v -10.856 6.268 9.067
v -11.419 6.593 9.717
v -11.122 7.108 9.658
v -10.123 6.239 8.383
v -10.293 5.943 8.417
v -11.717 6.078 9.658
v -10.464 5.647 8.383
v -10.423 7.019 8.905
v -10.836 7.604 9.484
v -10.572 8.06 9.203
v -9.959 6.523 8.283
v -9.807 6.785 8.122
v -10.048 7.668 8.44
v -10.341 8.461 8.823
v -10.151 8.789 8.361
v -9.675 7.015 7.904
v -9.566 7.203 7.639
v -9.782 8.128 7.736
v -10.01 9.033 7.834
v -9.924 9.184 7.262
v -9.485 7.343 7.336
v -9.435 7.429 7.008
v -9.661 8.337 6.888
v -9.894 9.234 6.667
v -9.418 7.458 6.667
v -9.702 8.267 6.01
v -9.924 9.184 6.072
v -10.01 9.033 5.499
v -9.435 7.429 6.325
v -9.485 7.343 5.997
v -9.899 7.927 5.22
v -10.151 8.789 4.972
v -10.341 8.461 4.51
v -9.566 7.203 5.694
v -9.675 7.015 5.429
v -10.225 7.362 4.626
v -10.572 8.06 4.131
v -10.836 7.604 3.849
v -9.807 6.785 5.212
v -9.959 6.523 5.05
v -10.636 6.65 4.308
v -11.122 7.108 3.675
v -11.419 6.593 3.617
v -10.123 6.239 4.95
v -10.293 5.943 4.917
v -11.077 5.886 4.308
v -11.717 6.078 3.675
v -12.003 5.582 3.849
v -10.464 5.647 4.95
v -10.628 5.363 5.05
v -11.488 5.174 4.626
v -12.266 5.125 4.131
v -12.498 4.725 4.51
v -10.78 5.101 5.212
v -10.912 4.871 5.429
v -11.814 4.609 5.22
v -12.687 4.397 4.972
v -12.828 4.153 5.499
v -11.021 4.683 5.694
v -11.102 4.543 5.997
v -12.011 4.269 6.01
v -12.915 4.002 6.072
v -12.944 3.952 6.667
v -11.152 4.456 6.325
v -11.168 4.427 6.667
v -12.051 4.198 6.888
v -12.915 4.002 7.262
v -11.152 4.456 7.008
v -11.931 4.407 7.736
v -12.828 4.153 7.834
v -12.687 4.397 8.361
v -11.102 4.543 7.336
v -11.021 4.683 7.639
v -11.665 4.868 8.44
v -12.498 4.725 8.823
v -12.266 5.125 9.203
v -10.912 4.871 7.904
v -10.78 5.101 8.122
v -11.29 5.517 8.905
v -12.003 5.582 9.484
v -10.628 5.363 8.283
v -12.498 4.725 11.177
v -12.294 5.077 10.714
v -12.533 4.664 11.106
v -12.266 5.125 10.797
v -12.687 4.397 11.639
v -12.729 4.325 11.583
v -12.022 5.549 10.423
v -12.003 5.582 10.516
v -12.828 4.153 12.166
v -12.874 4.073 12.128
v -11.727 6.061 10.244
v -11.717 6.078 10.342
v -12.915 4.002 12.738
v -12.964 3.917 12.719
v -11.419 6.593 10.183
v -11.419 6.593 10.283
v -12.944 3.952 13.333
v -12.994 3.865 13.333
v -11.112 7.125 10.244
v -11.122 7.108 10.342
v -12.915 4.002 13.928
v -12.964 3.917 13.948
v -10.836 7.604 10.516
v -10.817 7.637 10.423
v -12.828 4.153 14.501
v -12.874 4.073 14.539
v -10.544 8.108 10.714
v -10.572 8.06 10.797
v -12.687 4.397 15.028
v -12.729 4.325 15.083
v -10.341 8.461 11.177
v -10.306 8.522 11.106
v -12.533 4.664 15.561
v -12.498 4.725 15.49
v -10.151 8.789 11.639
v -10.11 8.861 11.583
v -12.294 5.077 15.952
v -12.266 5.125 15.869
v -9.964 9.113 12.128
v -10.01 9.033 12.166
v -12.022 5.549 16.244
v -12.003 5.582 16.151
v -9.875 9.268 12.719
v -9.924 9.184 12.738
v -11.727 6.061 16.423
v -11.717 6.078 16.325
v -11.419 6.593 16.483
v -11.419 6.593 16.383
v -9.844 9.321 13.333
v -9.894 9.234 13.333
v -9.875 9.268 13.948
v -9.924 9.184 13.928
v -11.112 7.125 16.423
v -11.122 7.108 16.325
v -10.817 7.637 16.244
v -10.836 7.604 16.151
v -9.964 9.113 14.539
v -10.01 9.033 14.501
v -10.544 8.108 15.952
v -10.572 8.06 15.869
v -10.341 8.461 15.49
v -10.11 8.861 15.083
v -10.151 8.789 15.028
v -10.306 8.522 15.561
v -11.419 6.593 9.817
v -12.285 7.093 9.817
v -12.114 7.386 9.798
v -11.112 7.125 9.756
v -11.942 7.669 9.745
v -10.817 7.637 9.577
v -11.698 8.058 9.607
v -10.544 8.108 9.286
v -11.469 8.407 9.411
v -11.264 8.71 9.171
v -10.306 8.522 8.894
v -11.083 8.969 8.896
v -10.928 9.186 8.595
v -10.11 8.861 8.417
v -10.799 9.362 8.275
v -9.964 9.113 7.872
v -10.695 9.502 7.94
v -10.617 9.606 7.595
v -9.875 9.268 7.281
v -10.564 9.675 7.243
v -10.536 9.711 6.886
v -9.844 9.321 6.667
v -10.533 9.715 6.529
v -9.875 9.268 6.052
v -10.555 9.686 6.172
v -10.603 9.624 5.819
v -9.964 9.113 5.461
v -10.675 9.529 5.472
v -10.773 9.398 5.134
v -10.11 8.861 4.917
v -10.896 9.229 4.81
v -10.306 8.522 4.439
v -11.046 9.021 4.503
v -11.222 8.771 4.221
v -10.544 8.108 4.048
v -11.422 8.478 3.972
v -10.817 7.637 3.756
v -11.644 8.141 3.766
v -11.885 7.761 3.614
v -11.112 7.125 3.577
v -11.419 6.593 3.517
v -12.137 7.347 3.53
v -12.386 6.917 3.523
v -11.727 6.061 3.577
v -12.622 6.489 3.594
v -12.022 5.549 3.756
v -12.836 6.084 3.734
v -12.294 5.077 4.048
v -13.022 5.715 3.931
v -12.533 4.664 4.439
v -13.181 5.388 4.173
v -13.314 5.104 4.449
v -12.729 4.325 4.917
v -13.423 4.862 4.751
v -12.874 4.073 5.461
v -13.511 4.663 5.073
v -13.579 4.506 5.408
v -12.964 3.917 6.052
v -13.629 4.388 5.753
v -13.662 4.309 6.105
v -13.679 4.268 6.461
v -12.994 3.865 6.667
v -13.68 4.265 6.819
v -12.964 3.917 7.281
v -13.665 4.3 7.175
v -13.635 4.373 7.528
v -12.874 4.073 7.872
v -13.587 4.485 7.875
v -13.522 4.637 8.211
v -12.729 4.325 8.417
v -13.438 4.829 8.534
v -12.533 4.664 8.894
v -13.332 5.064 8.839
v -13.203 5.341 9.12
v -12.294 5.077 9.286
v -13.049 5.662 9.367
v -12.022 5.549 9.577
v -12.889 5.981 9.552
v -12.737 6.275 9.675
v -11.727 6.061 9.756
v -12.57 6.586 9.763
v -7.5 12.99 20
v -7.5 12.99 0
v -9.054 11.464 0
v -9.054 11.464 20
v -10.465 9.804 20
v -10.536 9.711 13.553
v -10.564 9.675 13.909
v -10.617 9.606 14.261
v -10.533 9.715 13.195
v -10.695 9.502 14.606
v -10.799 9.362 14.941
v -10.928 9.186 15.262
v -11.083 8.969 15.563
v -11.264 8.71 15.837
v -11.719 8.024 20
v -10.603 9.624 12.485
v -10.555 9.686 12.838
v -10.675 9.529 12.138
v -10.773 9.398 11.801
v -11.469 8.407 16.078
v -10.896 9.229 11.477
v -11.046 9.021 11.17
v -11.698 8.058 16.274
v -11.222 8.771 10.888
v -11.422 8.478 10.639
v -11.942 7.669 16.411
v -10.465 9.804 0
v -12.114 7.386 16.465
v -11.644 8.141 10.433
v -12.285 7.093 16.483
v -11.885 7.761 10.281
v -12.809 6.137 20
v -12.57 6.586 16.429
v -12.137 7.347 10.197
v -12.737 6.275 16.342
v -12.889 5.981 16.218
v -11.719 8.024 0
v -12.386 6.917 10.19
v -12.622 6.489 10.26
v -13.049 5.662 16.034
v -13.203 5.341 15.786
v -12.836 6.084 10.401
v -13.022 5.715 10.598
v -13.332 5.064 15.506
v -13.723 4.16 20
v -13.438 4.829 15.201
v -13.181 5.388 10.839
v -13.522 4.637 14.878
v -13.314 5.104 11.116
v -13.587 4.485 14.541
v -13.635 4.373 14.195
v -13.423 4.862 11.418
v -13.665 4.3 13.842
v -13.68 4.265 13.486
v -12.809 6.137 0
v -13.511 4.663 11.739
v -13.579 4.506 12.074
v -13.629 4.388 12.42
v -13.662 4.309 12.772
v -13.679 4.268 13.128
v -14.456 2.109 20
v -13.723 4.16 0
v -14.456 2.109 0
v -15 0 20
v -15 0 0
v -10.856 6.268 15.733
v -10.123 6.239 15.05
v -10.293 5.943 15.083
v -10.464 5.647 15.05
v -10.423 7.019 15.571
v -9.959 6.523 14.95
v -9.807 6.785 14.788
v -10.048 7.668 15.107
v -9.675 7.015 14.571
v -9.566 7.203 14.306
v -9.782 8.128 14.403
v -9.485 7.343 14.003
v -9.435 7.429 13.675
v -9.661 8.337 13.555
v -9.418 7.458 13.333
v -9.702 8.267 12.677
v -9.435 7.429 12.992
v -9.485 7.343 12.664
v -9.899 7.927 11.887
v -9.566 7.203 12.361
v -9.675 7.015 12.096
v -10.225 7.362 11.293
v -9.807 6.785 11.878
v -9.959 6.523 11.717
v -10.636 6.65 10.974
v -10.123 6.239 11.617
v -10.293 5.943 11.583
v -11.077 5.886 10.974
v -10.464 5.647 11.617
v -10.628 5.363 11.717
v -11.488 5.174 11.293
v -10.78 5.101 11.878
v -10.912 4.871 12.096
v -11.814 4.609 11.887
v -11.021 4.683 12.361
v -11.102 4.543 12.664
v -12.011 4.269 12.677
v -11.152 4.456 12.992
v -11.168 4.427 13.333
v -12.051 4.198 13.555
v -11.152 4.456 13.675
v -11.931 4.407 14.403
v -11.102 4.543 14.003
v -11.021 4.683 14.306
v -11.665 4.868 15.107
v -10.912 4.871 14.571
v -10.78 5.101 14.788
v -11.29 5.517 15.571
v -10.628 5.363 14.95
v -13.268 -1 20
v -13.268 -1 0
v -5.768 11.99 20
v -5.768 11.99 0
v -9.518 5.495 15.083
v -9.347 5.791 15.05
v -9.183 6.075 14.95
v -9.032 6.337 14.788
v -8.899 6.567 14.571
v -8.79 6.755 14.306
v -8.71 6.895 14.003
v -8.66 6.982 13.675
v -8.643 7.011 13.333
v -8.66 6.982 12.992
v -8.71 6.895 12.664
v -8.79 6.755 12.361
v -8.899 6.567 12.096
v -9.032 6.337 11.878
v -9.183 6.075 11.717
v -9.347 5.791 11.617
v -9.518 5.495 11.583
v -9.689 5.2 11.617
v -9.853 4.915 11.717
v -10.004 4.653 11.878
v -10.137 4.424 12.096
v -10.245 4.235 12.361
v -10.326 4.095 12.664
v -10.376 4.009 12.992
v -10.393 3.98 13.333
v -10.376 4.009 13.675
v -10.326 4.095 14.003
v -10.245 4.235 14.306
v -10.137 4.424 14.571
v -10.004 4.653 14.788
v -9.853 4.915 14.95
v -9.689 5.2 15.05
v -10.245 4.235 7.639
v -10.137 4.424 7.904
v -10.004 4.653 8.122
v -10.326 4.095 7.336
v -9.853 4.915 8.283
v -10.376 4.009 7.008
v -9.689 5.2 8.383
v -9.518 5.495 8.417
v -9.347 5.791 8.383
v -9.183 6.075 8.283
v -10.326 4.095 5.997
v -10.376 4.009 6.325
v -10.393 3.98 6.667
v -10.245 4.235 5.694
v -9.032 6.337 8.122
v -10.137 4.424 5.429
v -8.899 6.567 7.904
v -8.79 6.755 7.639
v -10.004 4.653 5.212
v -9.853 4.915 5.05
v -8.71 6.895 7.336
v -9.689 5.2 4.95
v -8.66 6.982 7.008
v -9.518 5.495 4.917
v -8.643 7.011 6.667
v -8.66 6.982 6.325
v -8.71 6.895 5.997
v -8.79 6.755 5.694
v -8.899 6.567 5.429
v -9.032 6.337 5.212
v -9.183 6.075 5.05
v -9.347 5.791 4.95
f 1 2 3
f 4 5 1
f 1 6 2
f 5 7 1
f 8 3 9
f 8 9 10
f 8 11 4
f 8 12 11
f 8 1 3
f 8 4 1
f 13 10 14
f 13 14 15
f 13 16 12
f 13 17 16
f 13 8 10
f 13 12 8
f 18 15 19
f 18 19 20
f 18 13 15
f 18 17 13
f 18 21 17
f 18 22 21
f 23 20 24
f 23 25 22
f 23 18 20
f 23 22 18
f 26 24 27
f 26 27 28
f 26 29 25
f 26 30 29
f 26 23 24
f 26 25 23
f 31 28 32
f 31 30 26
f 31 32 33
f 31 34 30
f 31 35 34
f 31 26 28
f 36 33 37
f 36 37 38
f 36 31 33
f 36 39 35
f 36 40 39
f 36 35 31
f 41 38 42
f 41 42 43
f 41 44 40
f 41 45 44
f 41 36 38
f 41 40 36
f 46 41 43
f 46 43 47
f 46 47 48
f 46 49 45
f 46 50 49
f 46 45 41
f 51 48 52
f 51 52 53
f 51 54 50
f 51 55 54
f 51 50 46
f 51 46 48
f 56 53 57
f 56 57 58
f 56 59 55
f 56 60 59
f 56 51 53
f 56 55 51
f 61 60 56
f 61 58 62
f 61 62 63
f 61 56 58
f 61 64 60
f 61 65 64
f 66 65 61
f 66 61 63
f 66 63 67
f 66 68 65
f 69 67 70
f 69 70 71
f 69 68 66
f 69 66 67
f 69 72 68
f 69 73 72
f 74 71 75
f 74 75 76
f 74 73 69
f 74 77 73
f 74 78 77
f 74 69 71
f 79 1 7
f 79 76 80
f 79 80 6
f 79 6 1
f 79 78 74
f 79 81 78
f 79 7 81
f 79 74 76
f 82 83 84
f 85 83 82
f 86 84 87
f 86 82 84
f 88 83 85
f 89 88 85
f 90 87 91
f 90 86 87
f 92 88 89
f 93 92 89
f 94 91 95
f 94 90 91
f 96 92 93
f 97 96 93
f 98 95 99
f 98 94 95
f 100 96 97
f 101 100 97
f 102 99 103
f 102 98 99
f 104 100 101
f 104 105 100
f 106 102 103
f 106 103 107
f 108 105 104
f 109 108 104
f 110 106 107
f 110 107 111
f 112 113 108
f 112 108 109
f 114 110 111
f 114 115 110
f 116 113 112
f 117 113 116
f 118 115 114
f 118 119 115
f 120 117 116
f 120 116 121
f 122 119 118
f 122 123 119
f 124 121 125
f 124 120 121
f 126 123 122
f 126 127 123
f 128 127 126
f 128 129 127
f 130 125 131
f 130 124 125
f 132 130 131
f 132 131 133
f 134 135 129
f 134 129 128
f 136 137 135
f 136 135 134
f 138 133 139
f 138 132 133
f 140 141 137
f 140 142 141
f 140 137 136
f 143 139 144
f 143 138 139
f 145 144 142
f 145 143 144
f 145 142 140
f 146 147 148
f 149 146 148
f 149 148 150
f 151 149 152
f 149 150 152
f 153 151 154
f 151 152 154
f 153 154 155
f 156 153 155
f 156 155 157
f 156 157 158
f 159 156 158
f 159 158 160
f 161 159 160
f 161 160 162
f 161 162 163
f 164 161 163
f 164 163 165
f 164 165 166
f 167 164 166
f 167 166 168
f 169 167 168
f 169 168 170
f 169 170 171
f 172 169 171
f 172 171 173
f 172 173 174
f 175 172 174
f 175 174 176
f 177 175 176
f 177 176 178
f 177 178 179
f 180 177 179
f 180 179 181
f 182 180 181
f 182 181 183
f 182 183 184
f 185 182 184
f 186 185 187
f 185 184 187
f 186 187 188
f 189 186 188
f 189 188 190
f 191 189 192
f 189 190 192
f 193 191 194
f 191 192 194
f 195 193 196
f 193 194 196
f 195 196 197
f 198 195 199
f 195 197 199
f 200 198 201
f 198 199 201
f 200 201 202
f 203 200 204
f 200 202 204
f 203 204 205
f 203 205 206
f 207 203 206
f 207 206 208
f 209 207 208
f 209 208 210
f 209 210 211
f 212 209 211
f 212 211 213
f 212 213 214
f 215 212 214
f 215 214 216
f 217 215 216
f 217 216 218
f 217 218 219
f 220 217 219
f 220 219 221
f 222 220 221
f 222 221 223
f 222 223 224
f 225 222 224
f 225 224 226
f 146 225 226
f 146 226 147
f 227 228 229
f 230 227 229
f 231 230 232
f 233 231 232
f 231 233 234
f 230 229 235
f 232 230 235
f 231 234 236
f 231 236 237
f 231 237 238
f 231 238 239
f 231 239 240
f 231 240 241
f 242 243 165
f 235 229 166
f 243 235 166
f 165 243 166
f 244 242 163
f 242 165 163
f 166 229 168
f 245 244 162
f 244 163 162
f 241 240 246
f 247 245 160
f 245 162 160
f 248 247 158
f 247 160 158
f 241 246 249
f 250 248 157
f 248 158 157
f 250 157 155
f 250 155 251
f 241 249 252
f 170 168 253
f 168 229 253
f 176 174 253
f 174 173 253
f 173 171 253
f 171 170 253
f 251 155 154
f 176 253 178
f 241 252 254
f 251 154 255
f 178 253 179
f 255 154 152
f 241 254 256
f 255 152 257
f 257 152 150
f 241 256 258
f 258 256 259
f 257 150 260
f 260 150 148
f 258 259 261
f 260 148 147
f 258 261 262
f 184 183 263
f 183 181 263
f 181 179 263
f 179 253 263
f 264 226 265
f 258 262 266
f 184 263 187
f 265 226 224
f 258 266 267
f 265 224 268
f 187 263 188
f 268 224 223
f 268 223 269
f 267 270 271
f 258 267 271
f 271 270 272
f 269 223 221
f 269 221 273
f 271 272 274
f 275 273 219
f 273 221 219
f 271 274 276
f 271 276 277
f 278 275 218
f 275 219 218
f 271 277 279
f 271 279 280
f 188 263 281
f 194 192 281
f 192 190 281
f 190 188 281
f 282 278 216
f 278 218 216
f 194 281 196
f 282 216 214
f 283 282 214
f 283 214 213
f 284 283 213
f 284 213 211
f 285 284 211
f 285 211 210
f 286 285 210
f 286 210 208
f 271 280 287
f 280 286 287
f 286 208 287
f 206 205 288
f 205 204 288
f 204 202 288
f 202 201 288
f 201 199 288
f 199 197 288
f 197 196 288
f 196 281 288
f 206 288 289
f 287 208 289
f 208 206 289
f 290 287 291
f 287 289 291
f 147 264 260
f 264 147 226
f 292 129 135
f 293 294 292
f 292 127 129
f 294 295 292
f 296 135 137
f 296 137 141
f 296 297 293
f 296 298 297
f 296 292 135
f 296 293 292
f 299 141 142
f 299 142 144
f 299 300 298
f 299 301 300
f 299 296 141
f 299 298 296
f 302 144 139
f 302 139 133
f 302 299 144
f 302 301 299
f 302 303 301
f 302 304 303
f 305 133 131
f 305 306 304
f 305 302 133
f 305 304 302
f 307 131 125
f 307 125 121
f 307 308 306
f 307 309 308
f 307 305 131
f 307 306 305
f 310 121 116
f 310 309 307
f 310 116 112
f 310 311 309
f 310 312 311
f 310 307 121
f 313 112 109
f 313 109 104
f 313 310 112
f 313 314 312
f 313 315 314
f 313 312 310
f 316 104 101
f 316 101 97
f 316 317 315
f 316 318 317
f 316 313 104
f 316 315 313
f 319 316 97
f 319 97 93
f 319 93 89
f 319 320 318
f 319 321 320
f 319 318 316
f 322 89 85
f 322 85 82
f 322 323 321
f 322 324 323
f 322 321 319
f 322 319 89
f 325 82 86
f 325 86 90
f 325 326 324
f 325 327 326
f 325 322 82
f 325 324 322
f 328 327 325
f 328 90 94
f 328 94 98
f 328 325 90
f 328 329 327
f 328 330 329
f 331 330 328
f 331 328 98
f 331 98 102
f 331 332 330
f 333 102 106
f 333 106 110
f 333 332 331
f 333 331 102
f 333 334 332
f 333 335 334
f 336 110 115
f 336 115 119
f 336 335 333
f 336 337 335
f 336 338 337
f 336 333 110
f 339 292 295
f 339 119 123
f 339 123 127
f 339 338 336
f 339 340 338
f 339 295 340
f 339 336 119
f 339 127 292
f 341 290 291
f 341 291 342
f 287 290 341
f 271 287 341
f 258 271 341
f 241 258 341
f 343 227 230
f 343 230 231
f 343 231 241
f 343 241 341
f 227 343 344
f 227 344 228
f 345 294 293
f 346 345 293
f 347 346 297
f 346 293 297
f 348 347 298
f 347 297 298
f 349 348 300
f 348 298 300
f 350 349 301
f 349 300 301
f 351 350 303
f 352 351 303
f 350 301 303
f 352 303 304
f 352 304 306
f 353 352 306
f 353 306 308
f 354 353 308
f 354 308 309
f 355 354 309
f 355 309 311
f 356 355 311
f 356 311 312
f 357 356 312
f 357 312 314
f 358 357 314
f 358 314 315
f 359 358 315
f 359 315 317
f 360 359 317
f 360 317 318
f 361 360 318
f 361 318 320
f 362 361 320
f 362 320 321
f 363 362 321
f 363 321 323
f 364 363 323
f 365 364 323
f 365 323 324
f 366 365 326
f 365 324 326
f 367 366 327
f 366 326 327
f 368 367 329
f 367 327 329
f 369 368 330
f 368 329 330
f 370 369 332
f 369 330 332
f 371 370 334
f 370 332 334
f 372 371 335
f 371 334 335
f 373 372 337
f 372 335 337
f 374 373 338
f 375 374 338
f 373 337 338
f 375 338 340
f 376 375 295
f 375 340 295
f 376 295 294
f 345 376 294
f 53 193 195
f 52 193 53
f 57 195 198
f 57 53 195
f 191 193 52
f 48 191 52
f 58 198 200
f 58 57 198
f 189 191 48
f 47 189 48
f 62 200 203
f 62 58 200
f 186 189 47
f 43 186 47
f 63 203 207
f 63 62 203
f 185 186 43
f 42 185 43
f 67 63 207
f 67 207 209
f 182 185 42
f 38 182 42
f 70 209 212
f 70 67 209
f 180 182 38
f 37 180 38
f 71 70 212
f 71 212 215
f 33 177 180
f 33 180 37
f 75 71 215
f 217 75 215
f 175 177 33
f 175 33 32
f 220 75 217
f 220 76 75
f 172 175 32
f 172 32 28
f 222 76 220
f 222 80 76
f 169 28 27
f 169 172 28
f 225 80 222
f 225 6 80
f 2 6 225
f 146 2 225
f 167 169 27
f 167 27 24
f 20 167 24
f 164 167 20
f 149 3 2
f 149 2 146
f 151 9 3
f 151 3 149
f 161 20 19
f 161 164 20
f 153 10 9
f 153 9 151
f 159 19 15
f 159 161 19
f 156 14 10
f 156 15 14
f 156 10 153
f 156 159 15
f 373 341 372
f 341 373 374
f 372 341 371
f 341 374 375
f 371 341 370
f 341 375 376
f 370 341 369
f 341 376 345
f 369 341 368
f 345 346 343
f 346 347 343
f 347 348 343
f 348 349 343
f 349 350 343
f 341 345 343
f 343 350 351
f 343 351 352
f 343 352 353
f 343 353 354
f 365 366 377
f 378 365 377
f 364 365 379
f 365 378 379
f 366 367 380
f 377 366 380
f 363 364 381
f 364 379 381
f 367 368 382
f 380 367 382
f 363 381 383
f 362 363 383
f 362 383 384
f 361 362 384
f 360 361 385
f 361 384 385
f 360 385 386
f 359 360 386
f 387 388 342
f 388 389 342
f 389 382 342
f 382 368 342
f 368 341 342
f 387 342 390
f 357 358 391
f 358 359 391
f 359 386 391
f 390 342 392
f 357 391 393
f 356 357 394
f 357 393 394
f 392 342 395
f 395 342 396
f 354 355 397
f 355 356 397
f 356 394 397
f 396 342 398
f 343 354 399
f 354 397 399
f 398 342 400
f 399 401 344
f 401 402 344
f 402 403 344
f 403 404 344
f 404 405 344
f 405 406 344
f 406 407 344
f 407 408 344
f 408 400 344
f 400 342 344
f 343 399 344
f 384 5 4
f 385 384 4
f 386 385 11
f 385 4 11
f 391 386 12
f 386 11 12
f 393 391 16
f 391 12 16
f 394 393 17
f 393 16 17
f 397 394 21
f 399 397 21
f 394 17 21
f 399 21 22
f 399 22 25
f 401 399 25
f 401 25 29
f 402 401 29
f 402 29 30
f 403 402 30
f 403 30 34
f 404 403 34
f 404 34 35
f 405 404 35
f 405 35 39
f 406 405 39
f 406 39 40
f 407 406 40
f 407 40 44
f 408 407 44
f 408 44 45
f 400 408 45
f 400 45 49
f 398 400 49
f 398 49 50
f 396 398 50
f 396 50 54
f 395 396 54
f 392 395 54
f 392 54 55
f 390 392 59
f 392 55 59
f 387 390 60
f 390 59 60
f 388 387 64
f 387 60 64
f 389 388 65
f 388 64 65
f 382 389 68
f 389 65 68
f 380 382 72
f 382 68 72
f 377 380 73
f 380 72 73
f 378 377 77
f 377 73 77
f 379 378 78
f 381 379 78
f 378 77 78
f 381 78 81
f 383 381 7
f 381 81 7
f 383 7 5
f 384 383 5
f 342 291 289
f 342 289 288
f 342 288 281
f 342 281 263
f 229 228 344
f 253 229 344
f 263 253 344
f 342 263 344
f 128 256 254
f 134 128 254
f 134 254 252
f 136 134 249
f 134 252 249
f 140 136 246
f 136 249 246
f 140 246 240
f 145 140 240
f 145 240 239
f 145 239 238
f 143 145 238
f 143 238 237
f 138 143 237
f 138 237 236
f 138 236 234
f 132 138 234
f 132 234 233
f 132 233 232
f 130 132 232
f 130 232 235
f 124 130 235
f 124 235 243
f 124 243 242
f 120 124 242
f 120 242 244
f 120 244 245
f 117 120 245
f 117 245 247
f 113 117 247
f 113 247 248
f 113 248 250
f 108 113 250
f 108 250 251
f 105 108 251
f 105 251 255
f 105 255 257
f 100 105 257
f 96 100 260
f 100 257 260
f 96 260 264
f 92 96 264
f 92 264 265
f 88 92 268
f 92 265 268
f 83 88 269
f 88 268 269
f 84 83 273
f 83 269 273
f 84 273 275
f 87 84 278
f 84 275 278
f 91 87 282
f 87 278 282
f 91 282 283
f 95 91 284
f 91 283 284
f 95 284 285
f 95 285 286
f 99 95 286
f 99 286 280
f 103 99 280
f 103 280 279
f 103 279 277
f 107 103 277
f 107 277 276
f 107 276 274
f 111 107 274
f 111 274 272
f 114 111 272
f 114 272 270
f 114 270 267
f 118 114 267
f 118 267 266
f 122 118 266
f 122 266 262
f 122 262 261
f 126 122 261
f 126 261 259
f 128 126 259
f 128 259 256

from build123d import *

# Parameters (mm, degrees)
ESTRUSIONE_ESTRUSIONE1_DEPTH = 20
SCHIZZO3_R                   = 1.75
TAGLIO_ESTRUSIONE1_DEPTH     = 23.538199536
SCHIZZO3_3_R                 = 3.15
SCHIZZO3_3_R_2               = 1.75
TAGLIO_ESTRUSIONE2_DEPTH     = 1
SMUSSO2_SIZE                 = 1.3


with BuildPart() as part:
    # Schizzo2 → Estrusione-Estrusione1 (new body)
    with BuildSketch(Plane.XY):
        with BuildLine():
            Line((-5.767949192, 11.990381057), (-7.5, 12.990381057))
            ThreePointArc((-7.5, 12.990381057), (-12.285264352, 7.092900681), (-15, 0))
            Line((-15, 0), (-13.267949192, -1))
            Line((-13.267949192, -1), (-5.767949192, 11.990381057))
        make_face()
    extrude(amount=ESTRUSIONE_ESTRUSIONE1_DEPTH)

    # Schizzo3 → Taglio-Estrusione1 (cut, through all)
    with BuildSketch(Plane(origin=(-12.285264352, 7.092900681, 0), x_dir=(0, 0, 1), z_dir=(-0.86602540378444, 0.49999999999999756, 0))):
        with Locations((6.666666667, 0)):
            Circle(SCHIZZO3_R)
        with Locations((13.333333333, 0)):
            Circle(SCHIZZO3_R)
    extrude(amount=-TAGLIO_ESTRUSIONE1_DEPTH, mode=Mode.SUBTRACT)

    # Schizzo3<3> → Taglio-Estrusione2 (cut)
    # profile 1 of 2: a face of its own
    with BuildSketch(Plane(origin=(-12.285264352, 7.092900681, 0), x_dir=(0, 0, 1), z_dir=(-0.86602540378444, 0.49999999999999756, 0))):
        with Locations((6.666666667, 0)):
            Circle(SCHIZZO3_3_R)
        with Locations((6.666666667, 0)):
            Circle(SCHIZZO3_3_R_2, mode=Mode.SUBTRACT)
    # profile 2 of 2: a face of its own
    with BuildSketch(Plane(origin=(-12.285264352, 7.092900681, 0), x_dir=(0, 0, 1), z_dir=(-0.86602540378444, 0.49999999999999756, 0))):
        with Locations((13.333333333, 0)):
            Circle(SCHIZZO3_3_R)
        with Locations((13.333333333, 0)):
            Circle(SCHIZZO3_3_R_2, mode=Mode.SUBTRACT)
    extrude(amount=-TAGLIO_ESTRUSIONE2_DEPTH, mode=Mode.SUBTRACT)

    # Smusso2
    smusso2_edges = [part.edges().sort_by_distance(p)[0] for p in [
        (-11.419238948, 6.592900681, 4.916666667),
        (-11.419238948, 6.592900681, 11.583333333),
    ]]
    chamfer(smusso2_edges, length=SMUSSO2_SIZE)


solid = part.part
